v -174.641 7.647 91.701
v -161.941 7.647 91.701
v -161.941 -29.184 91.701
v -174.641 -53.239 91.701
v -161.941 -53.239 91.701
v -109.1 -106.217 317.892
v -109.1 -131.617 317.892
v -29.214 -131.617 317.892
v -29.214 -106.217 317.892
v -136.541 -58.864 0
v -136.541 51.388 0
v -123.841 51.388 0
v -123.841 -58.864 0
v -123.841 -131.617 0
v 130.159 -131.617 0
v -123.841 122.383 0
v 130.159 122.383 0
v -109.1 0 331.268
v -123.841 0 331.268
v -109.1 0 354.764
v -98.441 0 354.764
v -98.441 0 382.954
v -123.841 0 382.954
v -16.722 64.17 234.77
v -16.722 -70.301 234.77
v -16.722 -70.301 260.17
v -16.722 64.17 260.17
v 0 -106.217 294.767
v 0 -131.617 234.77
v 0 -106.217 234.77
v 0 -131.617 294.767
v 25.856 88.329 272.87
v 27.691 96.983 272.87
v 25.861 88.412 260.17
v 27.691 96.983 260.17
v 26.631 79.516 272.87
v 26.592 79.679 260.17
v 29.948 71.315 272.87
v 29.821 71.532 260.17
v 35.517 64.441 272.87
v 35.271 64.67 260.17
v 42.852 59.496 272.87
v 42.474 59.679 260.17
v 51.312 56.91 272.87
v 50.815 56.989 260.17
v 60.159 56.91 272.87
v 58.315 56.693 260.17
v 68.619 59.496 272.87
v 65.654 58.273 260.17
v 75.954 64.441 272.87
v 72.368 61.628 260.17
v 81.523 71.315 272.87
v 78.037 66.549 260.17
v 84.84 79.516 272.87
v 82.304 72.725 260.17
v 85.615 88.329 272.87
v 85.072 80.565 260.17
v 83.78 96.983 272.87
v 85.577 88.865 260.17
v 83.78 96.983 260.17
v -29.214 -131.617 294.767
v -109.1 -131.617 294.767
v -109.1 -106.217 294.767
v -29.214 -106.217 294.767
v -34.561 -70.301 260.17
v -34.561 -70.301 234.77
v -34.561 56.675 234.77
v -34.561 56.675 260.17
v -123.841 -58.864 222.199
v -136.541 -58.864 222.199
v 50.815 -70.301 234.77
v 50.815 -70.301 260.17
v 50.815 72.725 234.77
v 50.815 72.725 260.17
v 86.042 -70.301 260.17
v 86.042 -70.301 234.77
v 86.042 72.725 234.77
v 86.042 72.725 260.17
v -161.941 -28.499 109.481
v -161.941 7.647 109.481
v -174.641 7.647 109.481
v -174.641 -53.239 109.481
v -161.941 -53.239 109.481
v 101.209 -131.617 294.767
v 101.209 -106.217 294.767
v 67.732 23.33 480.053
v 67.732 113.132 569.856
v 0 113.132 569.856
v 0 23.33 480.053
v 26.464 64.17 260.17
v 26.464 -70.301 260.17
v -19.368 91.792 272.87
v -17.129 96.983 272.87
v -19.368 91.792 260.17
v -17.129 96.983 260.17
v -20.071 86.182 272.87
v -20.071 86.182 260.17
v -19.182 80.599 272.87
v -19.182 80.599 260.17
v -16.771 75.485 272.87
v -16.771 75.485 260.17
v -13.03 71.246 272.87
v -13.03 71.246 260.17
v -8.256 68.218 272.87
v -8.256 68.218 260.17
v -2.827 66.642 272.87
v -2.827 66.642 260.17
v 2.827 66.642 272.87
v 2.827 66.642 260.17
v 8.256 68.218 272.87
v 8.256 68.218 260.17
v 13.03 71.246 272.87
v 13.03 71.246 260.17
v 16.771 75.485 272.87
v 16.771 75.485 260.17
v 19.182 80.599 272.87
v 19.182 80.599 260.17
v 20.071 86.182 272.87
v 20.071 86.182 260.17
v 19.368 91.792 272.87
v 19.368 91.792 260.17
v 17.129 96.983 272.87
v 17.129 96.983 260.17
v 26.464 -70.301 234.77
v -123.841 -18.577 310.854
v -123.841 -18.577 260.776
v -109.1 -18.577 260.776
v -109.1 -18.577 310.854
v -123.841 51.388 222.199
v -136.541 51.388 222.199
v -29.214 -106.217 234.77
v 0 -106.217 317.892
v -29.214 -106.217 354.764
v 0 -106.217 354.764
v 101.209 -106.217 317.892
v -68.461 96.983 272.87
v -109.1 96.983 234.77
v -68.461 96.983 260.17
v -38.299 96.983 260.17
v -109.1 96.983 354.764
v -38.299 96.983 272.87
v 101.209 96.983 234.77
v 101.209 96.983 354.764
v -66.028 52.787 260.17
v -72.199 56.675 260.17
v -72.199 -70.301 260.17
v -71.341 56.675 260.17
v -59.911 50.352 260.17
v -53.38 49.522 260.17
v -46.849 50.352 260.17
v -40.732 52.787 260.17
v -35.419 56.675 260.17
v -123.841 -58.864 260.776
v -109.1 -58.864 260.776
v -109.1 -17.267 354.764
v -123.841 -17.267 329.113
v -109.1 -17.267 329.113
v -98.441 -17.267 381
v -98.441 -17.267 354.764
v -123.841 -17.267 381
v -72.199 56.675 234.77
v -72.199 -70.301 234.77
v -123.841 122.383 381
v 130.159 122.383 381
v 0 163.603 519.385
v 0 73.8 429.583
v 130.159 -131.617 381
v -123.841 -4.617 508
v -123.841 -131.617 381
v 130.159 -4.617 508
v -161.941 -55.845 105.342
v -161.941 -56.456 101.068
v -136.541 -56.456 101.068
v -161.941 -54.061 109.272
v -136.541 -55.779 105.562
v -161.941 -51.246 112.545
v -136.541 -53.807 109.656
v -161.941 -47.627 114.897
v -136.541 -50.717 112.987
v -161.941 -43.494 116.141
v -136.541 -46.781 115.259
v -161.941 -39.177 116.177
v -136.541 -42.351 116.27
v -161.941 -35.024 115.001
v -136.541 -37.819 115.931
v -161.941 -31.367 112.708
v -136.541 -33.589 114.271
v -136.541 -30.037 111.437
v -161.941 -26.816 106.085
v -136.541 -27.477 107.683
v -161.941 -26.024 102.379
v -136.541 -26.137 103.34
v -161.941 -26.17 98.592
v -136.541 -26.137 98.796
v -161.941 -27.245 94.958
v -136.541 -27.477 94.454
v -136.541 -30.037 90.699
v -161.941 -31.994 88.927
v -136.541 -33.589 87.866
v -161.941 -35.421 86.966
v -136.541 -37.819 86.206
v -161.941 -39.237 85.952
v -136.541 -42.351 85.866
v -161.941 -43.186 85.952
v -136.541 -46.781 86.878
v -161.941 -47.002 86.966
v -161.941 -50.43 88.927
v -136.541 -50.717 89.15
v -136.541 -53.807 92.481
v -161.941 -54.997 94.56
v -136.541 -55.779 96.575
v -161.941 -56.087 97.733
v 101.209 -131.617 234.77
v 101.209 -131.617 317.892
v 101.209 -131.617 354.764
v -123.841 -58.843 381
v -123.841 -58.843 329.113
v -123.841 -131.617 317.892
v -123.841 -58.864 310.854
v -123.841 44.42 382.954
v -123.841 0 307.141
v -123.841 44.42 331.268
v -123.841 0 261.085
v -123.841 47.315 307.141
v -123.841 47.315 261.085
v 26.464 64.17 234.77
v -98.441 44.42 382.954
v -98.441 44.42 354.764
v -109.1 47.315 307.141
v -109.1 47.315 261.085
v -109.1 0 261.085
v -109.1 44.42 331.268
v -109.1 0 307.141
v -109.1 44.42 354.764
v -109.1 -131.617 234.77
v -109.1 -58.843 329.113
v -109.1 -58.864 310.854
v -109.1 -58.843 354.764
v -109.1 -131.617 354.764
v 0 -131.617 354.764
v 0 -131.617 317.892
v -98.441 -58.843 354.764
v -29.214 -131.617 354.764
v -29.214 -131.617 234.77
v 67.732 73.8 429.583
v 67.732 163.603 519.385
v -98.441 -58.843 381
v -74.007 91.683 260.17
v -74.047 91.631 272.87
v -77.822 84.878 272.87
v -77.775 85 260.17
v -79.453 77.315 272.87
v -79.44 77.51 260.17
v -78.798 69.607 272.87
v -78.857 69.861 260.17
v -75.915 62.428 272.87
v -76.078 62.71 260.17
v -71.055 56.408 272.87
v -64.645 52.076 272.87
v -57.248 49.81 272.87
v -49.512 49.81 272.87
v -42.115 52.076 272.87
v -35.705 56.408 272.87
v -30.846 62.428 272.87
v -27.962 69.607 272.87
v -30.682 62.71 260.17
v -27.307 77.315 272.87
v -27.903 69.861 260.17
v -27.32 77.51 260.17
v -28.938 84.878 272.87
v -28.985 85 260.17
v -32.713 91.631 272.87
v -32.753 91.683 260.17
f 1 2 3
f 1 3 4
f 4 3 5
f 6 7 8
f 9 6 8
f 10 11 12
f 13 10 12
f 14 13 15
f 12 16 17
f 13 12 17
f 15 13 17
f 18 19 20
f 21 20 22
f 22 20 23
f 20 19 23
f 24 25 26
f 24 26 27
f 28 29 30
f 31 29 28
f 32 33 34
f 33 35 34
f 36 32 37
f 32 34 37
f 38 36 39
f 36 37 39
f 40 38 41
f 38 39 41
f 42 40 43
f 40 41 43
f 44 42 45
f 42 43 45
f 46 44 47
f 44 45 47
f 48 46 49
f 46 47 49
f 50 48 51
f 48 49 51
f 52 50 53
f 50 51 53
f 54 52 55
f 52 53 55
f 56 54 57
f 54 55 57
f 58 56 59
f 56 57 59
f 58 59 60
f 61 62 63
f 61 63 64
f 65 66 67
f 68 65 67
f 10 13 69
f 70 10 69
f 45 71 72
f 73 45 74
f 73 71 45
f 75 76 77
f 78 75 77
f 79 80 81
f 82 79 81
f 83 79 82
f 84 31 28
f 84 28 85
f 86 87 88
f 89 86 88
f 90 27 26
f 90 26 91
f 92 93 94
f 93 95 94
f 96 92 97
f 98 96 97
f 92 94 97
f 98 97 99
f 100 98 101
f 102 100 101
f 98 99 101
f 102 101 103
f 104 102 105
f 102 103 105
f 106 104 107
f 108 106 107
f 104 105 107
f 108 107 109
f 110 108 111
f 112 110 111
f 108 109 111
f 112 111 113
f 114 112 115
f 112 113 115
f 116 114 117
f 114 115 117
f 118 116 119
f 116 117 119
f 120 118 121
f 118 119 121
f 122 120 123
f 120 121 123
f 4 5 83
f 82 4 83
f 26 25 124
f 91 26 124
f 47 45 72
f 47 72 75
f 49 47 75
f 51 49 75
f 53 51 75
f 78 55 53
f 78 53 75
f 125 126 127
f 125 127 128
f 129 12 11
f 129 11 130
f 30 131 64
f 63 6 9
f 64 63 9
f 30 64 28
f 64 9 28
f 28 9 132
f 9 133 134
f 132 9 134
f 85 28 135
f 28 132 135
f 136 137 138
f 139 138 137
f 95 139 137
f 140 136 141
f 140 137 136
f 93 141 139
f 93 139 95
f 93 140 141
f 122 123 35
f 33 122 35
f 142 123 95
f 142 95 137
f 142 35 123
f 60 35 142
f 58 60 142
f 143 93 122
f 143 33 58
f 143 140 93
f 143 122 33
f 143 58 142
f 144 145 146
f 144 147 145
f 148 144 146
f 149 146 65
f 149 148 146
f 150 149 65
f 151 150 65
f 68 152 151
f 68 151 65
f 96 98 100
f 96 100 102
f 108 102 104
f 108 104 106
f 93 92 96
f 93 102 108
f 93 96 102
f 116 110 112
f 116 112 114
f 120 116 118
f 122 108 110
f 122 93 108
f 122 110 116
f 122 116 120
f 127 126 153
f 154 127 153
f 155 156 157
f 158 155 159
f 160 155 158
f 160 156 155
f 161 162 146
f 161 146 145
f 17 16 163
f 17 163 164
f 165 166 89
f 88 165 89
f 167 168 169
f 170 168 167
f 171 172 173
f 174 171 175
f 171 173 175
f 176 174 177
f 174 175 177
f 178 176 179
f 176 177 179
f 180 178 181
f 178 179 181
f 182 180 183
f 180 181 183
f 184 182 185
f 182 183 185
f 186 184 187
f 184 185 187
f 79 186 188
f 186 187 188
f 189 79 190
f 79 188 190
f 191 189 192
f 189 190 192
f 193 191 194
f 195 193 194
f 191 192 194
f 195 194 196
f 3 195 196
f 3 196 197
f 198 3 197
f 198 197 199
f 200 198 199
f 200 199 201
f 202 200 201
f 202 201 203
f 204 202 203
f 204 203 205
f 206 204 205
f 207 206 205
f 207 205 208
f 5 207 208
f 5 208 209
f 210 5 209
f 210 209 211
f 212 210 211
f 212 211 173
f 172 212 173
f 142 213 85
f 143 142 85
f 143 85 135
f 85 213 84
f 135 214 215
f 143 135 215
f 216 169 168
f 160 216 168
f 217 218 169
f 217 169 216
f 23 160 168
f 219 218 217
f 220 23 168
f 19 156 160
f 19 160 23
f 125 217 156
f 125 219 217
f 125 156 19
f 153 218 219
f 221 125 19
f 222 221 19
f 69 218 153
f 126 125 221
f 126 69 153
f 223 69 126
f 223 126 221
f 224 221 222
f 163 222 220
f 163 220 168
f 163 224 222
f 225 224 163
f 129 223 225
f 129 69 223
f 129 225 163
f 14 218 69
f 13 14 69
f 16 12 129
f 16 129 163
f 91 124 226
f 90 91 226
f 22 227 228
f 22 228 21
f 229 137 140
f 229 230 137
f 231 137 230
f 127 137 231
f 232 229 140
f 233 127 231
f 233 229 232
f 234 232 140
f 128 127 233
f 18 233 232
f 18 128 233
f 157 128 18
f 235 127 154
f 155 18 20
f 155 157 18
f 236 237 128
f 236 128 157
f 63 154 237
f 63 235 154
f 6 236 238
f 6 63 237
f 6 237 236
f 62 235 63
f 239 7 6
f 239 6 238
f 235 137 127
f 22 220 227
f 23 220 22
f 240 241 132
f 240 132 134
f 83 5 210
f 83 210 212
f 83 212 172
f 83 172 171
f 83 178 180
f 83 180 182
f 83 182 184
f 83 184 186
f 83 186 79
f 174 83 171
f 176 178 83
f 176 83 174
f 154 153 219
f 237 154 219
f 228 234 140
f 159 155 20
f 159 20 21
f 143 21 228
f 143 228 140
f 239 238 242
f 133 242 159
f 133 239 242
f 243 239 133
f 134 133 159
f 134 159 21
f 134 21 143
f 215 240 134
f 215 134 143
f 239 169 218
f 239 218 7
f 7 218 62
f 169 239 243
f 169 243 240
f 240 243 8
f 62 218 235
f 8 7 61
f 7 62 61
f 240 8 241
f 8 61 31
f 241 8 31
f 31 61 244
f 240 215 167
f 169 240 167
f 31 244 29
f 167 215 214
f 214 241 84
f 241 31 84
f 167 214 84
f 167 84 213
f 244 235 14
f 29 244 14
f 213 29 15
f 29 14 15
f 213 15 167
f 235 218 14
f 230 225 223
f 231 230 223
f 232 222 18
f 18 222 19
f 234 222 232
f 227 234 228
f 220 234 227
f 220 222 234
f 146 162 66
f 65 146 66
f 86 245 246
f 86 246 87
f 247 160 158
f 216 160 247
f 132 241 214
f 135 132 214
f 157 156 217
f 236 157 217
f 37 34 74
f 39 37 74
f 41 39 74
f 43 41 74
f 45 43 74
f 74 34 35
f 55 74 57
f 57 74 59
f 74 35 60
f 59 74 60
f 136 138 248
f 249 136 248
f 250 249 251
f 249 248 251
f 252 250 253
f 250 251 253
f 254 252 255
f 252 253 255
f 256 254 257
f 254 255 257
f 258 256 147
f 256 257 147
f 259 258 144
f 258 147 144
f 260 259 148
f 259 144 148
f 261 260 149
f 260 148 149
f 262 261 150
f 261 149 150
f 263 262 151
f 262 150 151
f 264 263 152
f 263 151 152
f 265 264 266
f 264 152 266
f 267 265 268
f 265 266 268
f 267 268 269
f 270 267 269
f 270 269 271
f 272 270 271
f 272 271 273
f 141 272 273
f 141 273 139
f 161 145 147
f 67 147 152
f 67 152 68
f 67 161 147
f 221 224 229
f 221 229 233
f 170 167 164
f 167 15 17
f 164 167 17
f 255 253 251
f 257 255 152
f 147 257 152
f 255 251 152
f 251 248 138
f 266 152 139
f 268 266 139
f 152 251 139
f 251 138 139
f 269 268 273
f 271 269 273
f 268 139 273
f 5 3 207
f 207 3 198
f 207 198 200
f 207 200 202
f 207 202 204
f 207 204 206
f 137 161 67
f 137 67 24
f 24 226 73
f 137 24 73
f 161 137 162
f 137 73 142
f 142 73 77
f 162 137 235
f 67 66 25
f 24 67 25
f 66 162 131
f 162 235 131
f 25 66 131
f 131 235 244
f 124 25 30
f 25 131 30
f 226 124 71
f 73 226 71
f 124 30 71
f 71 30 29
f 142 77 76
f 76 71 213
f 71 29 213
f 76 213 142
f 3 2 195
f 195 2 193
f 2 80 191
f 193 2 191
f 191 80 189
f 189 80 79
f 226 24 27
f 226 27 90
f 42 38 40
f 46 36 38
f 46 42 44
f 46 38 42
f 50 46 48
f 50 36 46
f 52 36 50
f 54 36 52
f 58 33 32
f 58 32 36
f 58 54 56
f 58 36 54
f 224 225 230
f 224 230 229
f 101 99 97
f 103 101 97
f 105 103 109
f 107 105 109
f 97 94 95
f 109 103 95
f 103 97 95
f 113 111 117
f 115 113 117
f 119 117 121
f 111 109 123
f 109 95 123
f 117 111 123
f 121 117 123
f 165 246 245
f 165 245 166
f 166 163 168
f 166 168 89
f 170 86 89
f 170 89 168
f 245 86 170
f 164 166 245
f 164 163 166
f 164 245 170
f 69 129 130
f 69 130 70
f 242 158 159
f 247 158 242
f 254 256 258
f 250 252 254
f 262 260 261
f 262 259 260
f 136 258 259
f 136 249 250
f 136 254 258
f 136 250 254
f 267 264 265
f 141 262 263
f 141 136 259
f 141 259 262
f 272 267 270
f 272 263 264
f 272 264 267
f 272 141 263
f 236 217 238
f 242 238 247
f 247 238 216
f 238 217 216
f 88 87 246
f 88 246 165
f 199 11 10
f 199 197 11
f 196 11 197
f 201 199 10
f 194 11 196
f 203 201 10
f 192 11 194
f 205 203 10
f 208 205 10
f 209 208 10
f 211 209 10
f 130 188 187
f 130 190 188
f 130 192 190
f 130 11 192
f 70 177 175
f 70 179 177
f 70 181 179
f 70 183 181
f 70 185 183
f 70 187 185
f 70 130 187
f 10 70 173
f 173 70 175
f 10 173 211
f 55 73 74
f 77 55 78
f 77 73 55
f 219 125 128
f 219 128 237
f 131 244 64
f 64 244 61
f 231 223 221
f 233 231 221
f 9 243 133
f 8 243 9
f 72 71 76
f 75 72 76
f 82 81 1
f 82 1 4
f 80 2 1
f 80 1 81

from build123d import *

# Parameters (mm, degrees)
F0_W      = 254
F0_H      = 254
F1_DEPTH  = 508
F2_SIZE   = 127
F3_SIZE   = 126.99999
F4_W      = 110.2521903813
F4_H      = 222.1985608339
F5_DEPTH  = 12.7
F6_R      = 15.2445630658
F7_DEPTH  = 25.4
F8_W      = 60.8862751365
F8_H      = 17.78
F9_DEPTH  = 12.7
F10_W     = 44.4203019142
F10_H     = 51.6851246357
F10_W_2   = 47.3152212799
F10_H_2   = 46.0566580296
F10_W_3   = 41.5758583695
F10_H_3   = 51.8873212337
F10_W_4   = 40.2868166566
F10_H_4   = 50.077855587
F11_DEPTH = 25.4
F12_W     = 67.7322521806
F12_H     = 71.3757276535
F13_DEPTH = 127
F14_W     = 210.3085294366
F14_H     = 119.9935823679
F15_DEPTH = 228.6
F16_W     = 37.6376099885
F16_H     = 126.9762441516
F16_W_2   = 43.185967952
F16_H_2   = 134.4709768891
F16_W_3   = 35.2269485593
F16_H_3   = 143.0262625217
F17_DEPTH = 25.4
F18_R     = 26.1262901257
F18_R_2   = 20.0737439282
F18_R_3   = 29.9342227193
F19_DEPTH = 12.7
F20_W     = 29.2137209326
F20_H     = 63.1077764034
F20_H_2   = 23.1252685189
F20_W_2   = 94.6274452358
F20_W_3   = 130.1588338315
F20_H_3   = 76.8547430634
F21_DEPTH = 25.4


# Not quite as in the source:
# - a fillet or chamfer is up to 0.001 mm smaller than in the source, because OpenCascade refuses the exact size


with BuildPart() as f1:
    # F0 (on Top) → F1 (new body)
    with BuildSketch(Plane.XY):
        with Locations((3.1588338315, -4.6172558538)):
            Rectangle(F0_W, F0_H)
    extrude(amount=F1_DEPTH)

    # F2
    f2_edges = [f1.edges().sort_by_distance(p)[0] for p in [
        (3.158834, -131.617256, 508),
    ]]
    chamfer(f2_edges, length=F2_SIZE)

    # F3 (size 127 in the source; OpenCascade refuses exactly that, so slightly less here)
    f3_edges = [f1.edges().sort_by_distance(p)[0] for p in [
        (3.158834, 122.382744, 508),
    ]]
    chamfer(f3_edges, length=F3_SIZE)

    # F4 (on face) → F5 (join)
    with BuildSketch(Plane(origin=(-123.8411661685, 0, 0), x_dir=(0, -1, 0), z_dir=(-1, 0, 0))):
        with Locations((3.7376638502, 111.099280417)):
            Rectangle(F4_W, F4_H)
    extrude(amount=F5_DEPTH)

    # F6 (on face) → F7 (join)
    with BuildSketch(Plane(origin=(-136.5411661685, 0, 0), x_dir=(0, -1, 0), z_dir=(-1, 0, 0))):
        with Locations((41.2117242813, 101.0684147477)):
            Circle(F6_R)
    extrude(amount=F7_DEPTH)

    # F8 (on face) → F9 (join)
    with BuildSketch(Plane(origin=(-161.9411661685, 0, 0), x_dir=(0, -1, 0), z_dir=(-1, 0, 0))):
        with Locations((22.795823104, 100.5913294025)):
            Rectangle(F8_W, F8_H)
    extrude(amount=F9_DEPTH)

    # F10 (on face) → F11 (cut)
    with BuildSketch(Plane(origin=(-123.8411661685, 0, 0), x_dir=(0, -1, 0), z_dir=(-1, 0, 0))):
        with Locations((-22.2101509571, 357.1109622717)):
            Rectangle(F10_W, F10_H)
        with Locations((-23.6576106399, 284.112855792)):
            Rectangle(F10_W_2, F10_H_2)
        with Locations((38.0553556606, 355.0563393831)):
            Rectangle(F10_W_3, F10_H_3)
        with Locations((38.7203507125, 285.8152091503)):
            Rectangle(F10_W_4, F10_H_4)
    extrude(amount=-F11_DEPTH, mode=Mode.SUBTRACT)

    # F12 (on face) → F13 (join)
    with BuildSketch(Plane(origin=(0, 251.6913720731, 251.6913720731), x_dir=(-1, 0, 0), z_dir=(0, 0.7071067812, 0.7071067812))):
        with Locations((-33.8661260903, 287.2642278671)):
            Rectangle(F12_W, F12_H)
    extrude(amount=F13_DEPTH)

    # F14 (on face) → F15 (cut)
    with BuildSketch(Plane.XZ.offset(131.6172558538)):
        with Locations((-3.9455778897, 294.7669550776)):
            Rectangle(F14_W, F14_H)
    extrude(amount=-F15_DEPTH, mode=Mode.SUBTRACT)

    # F16 (on face) → F17 (join)
    with BuildSketch(Plane.XY.offset(234.7701638937)):
        with Locations((-53.3800702542, -6.8131200969)):
            Rectangle(F16_W, F16_H)
        with Locations((4.870776087, -3.0657537282)):
            Rectangle(F16_W_2, F16_H_2)
        with Locations((68.4281103313, 1.2118890882)):
            Rectangle(F16_W_3, F16_H_3)
    extrude(amount=F17_DEPTH)

    # F18 (on face) → F19 (join)
    with BuildSketch(Plane.XY.offset(260.1701638937)):
        with Locations((-53.3800702542, 75.6483599544)):
            Circle(F18_R)
        with Locations((0, 86.5157917142)):
            Circle(F18_R_2)
        with Locations((55.7353012264, 86.5157917142)):
            Circle(F18_R_3)
    extrude(amount=F19_DEPTH)

    # F20 (on face) → F21 (join)
    with BuildSketch(Plane.XZ.offset(131.6172558538)):
        with Locations((-14.6068604663, 349.4461117983)):
            Rectangle(F20_W, F20_H)
        with Locations((-14.6068604663, 306.3295893371)):
            Rectangle(F20_W, F20_H_2)
        with Locations((-76.5274435505, 306.3295893371)):
            Rectangle(F20_W_2, F20_H_2)
        with Locations((65.0794169158, 306.3295893371)):
            Rectangle(F20_W_3, F20_H_2)
        with Locations((-14.6068604663, 256.3395835459)):
            Rectangle(F20_W, F20_H_3)
    extrude(amount=-F21_DEPTH)


solid = f1.part
